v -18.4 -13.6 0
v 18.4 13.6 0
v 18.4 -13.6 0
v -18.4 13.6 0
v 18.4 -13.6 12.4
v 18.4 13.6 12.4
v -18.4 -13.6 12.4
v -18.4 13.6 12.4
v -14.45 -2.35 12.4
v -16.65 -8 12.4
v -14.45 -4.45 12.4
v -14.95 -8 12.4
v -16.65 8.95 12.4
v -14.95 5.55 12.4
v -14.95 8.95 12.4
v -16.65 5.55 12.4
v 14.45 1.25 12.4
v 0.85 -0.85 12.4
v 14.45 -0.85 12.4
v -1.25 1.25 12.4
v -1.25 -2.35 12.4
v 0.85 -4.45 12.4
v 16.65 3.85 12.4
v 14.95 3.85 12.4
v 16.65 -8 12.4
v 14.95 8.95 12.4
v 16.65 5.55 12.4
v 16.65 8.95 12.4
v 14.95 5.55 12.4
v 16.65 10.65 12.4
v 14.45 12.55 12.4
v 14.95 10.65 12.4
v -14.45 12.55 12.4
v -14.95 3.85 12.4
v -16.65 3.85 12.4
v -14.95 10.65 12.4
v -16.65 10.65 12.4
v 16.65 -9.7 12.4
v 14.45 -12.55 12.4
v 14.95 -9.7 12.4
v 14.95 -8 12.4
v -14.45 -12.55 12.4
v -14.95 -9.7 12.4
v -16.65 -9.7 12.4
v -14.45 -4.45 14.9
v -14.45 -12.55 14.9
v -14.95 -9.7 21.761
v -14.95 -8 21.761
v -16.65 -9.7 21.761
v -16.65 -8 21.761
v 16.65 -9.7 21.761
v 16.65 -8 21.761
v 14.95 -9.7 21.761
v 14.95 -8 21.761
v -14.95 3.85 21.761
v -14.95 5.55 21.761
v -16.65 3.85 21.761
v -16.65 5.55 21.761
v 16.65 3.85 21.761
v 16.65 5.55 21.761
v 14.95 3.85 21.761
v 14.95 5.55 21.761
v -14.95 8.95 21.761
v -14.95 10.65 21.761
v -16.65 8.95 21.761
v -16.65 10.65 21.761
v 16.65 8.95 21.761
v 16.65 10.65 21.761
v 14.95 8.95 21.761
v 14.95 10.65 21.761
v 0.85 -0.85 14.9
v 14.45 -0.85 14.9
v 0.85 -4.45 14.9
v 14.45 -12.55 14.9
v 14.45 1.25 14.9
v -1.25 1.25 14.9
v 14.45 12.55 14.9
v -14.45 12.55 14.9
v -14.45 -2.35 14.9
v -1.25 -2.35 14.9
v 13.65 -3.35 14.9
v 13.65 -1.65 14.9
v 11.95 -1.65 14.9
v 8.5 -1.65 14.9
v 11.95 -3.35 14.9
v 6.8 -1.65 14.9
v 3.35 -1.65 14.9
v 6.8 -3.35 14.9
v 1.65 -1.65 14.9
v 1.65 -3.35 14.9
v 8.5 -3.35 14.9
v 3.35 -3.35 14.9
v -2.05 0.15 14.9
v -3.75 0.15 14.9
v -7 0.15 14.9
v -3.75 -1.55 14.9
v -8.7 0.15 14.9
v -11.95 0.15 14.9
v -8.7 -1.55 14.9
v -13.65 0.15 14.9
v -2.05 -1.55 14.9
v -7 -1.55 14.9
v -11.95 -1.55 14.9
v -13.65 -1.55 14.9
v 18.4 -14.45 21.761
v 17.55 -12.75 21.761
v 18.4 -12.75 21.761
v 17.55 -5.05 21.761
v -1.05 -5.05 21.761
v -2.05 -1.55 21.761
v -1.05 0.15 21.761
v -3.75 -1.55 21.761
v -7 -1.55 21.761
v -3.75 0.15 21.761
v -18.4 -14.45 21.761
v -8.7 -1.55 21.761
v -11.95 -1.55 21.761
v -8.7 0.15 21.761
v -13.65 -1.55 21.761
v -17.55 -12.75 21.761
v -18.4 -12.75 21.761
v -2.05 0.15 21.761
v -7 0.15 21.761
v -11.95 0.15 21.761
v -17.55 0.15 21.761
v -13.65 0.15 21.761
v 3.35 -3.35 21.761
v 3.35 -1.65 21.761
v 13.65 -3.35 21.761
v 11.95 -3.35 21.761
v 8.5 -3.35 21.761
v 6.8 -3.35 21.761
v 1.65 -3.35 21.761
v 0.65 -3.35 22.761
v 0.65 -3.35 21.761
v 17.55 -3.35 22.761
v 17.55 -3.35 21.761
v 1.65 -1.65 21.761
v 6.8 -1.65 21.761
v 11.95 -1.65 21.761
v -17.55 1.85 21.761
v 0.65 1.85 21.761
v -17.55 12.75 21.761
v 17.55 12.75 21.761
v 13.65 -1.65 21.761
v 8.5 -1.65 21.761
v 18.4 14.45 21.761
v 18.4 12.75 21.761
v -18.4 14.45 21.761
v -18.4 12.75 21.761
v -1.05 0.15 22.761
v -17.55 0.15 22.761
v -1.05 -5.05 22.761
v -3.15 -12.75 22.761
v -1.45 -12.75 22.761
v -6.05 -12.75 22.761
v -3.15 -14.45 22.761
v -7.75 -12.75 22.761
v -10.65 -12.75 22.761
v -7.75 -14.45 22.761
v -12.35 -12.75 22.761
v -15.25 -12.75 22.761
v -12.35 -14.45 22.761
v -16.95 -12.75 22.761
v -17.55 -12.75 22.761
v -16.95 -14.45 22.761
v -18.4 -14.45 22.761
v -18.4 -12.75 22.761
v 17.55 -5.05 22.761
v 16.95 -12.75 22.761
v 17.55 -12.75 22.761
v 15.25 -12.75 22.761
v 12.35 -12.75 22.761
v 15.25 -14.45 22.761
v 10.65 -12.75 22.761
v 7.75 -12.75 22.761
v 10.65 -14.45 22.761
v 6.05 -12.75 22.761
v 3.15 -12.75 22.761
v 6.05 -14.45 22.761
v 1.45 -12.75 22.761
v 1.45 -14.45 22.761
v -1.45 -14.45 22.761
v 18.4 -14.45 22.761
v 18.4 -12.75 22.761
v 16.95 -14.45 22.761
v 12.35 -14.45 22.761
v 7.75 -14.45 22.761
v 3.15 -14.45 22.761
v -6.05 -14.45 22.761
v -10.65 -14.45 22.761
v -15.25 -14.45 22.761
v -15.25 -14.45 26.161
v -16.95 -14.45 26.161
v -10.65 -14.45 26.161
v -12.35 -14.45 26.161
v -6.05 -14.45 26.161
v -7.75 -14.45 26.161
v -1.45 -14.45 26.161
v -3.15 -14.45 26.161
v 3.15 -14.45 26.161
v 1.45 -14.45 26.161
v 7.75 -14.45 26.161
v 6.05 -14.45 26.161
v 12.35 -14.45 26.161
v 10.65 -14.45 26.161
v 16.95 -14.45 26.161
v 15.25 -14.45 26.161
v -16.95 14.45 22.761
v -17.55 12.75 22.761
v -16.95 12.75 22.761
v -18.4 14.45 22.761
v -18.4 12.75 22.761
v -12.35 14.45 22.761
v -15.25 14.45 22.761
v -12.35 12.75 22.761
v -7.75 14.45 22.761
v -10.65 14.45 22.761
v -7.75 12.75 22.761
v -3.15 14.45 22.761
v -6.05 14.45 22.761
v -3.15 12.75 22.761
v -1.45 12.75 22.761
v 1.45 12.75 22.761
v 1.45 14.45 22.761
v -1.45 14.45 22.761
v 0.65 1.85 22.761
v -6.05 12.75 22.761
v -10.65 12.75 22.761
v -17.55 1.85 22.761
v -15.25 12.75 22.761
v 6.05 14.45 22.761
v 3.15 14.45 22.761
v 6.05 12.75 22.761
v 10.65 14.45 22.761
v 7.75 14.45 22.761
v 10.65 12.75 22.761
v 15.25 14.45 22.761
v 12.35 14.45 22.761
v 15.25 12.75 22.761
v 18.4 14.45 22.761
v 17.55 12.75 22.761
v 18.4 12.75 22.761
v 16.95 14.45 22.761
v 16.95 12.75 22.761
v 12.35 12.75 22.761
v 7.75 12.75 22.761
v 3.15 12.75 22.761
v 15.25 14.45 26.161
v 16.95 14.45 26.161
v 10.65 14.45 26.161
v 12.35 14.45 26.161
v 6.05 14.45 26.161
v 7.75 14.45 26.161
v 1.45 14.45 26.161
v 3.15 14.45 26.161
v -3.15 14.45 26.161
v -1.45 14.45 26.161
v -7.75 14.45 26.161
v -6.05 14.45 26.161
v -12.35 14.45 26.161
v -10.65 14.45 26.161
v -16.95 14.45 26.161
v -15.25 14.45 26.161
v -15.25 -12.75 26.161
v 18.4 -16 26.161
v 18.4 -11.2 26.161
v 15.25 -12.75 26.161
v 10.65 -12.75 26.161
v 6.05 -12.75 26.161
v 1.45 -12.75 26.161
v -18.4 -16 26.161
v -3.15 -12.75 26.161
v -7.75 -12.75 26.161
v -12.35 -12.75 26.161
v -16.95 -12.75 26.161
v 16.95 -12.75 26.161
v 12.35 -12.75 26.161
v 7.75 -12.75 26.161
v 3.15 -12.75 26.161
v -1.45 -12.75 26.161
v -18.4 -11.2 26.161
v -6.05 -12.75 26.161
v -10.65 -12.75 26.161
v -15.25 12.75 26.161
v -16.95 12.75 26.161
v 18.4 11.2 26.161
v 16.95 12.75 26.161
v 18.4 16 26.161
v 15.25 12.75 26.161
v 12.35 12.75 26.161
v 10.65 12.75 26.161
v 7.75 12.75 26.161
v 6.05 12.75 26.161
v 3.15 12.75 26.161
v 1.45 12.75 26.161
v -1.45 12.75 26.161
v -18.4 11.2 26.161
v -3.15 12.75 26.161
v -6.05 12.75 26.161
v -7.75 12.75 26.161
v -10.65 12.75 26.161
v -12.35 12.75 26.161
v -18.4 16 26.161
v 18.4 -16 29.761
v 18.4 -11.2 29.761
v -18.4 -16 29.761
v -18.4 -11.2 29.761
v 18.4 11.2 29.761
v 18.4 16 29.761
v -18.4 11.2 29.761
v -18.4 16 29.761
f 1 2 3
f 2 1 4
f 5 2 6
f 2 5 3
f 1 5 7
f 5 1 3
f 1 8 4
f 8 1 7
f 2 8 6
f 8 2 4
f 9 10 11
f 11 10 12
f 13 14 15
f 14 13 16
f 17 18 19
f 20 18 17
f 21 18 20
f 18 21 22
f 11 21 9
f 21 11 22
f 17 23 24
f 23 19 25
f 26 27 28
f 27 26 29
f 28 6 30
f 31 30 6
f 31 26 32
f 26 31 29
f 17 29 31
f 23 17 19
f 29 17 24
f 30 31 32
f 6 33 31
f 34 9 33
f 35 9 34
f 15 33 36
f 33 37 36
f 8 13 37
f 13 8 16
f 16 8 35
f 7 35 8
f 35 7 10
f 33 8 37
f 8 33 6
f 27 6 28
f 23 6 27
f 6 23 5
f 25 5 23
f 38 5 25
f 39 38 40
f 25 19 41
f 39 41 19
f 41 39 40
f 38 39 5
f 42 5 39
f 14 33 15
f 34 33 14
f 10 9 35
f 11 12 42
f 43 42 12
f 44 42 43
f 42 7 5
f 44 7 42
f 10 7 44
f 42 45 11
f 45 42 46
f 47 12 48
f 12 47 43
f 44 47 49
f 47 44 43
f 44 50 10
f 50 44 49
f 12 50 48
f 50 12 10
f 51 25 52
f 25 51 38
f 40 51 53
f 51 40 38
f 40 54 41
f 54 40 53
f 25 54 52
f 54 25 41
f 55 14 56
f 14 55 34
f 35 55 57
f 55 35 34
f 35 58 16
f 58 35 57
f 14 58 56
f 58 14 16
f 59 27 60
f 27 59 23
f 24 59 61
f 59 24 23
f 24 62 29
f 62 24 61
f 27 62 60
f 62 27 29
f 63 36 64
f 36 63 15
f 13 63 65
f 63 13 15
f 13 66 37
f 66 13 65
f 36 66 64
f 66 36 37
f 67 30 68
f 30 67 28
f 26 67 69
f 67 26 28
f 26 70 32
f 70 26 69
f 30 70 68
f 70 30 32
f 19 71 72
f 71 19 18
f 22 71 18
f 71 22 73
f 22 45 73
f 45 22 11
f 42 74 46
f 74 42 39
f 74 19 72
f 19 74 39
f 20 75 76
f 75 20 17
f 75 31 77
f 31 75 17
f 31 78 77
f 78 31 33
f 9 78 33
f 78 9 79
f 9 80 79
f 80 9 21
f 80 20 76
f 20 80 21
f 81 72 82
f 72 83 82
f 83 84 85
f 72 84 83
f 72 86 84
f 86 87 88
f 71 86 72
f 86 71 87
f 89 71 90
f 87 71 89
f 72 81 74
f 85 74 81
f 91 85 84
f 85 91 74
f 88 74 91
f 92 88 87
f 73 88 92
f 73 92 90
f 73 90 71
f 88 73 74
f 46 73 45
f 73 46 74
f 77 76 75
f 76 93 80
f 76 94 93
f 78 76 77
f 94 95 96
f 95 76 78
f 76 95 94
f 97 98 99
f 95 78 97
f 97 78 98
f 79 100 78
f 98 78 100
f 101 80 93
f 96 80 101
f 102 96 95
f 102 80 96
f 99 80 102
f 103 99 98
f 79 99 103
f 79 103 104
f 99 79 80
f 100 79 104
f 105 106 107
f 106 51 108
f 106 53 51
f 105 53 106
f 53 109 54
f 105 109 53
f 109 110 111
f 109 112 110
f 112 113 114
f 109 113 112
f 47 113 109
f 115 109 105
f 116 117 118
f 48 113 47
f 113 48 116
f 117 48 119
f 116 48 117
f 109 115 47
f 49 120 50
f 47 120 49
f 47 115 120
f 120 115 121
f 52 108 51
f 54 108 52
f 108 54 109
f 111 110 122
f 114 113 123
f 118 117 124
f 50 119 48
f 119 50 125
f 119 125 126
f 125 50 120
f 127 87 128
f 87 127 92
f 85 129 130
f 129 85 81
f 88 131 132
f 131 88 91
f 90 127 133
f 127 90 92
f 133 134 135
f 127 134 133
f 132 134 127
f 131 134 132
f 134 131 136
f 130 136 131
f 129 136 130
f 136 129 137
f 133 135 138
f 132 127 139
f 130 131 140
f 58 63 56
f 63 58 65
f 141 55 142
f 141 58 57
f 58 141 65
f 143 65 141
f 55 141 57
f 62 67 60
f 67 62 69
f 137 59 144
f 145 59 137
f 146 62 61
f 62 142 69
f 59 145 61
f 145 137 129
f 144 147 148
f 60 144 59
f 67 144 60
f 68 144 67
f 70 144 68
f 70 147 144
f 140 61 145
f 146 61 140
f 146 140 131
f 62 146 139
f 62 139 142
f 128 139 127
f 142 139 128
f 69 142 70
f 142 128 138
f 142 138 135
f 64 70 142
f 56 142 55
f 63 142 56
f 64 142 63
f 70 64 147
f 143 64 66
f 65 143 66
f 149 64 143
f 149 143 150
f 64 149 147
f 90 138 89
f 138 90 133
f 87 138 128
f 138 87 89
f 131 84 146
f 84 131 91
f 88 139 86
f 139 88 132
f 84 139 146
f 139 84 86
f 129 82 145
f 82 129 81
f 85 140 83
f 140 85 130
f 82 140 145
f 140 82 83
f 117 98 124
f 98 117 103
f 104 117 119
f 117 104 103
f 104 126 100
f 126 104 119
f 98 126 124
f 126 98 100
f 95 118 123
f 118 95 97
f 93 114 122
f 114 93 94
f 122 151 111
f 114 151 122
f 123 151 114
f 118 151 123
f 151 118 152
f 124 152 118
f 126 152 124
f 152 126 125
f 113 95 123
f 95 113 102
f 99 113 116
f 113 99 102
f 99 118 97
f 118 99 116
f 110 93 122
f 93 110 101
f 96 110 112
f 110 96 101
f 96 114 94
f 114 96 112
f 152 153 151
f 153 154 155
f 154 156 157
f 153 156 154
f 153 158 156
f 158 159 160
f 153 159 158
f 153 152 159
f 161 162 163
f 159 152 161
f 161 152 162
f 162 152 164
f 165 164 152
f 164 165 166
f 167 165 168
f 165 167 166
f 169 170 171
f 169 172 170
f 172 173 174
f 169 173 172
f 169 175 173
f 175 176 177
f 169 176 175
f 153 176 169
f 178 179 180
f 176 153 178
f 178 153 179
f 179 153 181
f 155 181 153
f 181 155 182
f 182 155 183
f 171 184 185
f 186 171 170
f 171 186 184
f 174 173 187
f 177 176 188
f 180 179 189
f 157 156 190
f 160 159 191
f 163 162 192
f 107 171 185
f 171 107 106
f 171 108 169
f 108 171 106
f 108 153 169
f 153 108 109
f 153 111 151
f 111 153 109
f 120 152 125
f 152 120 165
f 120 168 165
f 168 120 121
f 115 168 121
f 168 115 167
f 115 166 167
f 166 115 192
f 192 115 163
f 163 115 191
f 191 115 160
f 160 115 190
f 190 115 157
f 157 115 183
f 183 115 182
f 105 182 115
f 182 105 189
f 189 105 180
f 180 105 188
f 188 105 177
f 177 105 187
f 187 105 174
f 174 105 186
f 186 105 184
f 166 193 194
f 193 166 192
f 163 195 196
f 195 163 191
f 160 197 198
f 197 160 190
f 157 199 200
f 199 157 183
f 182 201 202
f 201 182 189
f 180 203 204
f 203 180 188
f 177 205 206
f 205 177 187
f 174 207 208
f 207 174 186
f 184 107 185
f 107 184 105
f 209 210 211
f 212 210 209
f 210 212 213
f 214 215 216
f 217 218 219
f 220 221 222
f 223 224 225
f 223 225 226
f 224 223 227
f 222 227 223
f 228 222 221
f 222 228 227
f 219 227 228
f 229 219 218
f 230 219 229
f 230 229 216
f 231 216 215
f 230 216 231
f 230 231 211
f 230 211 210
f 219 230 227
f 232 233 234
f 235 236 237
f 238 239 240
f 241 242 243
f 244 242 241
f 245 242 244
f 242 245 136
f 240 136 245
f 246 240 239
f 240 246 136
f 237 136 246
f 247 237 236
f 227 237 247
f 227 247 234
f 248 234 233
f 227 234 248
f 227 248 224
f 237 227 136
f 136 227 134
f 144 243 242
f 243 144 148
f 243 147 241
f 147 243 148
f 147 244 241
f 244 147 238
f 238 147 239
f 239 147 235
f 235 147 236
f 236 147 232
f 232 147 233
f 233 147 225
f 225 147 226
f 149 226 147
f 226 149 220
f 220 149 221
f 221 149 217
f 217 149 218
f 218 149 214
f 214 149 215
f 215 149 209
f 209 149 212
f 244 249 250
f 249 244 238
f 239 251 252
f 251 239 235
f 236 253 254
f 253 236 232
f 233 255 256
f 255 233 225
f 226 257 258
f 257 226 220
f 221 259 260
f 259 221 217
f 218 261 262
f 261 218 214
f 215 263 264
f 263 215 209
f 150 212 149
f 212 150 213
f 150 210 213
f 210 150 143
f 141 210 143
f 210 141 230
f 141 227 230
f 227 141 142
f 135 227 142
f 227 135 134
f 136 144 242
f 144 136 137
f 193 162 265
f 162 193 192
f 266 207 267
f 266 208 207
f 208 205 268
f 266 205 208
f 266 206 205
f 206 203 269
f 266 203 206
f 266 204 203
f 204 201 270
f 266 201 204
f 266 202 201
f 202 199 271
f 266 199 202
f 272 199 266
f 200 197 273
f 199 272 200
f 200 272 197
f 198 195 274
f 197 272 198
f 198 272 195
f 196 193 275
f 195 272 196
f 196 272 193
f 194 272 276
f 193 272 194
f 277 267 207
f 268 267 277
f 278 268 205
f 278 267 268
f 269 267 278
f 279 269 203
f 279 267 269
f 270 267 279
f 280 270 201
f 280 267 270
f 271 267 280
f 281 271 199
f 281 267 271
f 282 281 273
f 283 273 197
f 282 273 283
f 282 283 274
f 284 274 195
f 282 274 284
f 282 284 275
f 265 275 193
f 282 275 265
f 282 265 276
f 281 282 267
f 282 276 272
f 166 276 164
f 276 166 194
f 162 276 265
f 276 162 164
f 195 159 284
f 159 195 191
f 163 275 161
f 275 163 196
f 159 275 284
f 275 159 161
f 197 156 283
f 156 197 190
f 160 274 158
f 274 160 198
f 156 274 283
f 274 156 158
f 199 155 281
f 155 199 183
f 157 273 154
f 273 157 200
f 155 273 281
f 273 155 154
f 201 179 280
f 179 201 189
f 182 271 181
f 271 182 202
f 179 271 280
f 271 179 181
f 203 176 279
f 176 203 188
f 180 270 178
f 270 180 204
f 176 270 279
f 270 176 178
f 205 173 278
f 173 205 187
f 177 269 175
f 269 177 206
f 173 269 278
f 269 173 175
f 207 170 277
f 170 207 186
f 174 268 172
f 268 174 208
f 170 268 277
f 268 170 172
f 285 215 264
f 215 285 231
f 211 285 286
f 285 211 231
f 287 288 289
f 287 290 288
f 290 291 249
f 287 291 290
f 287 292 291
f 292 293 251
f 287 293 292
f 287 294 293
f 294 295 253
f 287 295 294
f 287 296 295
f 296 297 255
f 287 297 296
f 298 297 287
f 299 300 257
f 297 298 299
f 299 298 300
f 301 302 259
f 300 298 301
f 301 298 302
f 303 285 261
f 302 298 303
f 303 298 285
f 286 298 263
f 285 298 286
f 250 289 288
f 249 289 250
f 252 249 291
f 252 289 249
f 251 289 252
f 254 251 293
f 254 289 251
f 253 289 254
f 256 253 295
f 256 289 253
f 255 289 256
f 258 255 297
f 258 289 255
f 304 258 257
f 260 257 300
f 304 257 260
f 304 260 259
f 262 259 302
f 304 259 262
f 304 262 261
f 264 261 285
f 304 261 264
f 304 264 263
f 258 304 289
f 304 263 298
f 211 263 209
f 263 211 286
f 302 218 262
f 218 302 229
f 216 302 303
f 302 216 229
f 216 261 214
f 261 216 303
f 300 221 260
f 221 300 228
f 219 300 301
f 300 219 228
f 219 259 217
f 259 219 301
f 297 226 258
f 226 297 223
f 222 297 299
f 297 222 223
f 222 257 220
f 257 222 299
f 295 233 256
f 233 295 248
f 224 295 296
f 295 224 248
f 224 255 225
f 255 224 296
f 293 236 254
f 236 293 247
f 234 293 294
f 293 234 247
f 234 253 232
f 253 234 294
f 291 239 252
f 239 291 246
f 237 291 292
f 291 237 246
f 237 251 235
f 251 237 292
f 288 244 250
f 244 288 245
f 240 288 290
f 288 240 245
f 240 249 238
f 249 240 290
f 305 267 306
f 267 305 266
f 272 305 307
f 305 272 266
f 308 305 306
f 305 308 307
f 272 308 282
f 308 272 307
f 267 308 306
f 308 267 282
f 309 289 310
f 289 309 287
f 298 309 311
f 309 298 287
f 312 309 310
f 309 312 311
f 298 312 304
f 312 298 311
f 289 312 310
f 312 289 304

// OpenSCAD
// Generated by SolidPython 0.4.2 on 2020-09-29 23:20:26
//!OpenSCAD

scale(v = 0.0100000000) {
	translate(v = [-1840, -1360, 0]) {
		union() {
			color(c = [0.4000000000, 0.4000000000, 0.4000000000]) {
				translate(v = [0, 0, 0]) {
					linear_extrude(height = 1000.0000000000) {
						polygon(paths = [[0, 1, 2, 3]], points = [[0, 0], [0, 2720], [3680, 2720], [3680, 0]]);
					}
				}
			}
			color(c = [0.2000000000, 0.6000000000, 0.2000000000]) {
				translate(v = [0, 0, 1000.0000000000]) {
					linear_extrude(height = 120.0000000000) {
						polygon(paths = [[0, 1, 2, 3]], points = [[0, 1305], [0, 2720], [3680, 2720], [3680, 1305]]);
					}
				}
			}
			color(c = [0.4000000000, 0.4000000000, 0.4000000000]) {
				translate(v = [0, 0, 1000.0000000000]) {
					linear_extrude(height = 120.0000000000) {
						polygon(paths = [[0, 1, 2, 3]], points = [[0, 0], [0, 1305], [3680, 1305], [3680, 0]]);
					}
				}
			}
			color(c = [0.9000000000, 0.6000000000, 0.6000000000]) {
				translate(v = [0, 0, 1120.0000000000]) {
					linear_extrude(height = 120.0000000000) {
						polygon(paths = [[0, 1, 2, 3]], points = [[135, 1615], [135, 2485], [395, 2485], [395, 1615]]);
					}
				}
			}
			color(c = [0.9000000000, 0.6000000000, 0.6000000000]) {
				translate(v = [0, 0, 1120.0000000000]) {
					linear_extrude(height = 120.0000000000) {
						polygon(paths = [[0, 1, 2, 3]], points = [[3285, 1615], [3285, 2485], [3545, 2485], [3545, 1615]]);
					}
				}
			}
			color(c = [0.9000000000, 0.6000000000, 0.9000000000]) {
				translate(v = [0, 0, 1120.0000000000]) {
					linear_extrude(height = 120.0000000000) {
						polygon(paths = [[0, 1, 2, 3]], points = [[135, 235], [135, 785], [395, 785], [395, 235]]);
					}
				}
			}
			color(c = [0.9000000000, 0.6000000000, 0.9000000000]) {
				translate(v = [0, 0, 1120.0000000000]) {
					linear_extrude(height = 120.0000000000) {
						polygon(paths = [[0, 1, 2, 3]], points = [[3285, 235], [3285, 785], [3545, 785], [3545, 235]]);
					}
				}
			}
			color(c = [0.2000000000, 0.6000000000, 0.2000000000]) {
				translate(v = [0, 0, 1120.0000000000]) {
					linear_extrude(height = 120.0000000000) {
						difference() {
							polygon(paths = [[0, 1, 2, 3]], points = [[0, 1305], [0, 2720], [3680, 2720], [3680, 1305]]);
							polygon(paths = [[0, 1, 2, 3]], points = [[135, 1615], [395, 1615], [395, 2485], [135, 2485]]);
							polygon(paths = [[0, 1, 2, 3]], points = [[3285, 1615], [3545, 1615], [3545, 2485], [3285, 2485]]);
						}
					}
				}
			}
			color(c = [0.4000000000, 0.4000000000, 0.4000000000]) {
				translate(v = [0, 0, 1120.0000000000]) {
					linear_extrude(height = 120.0000000000) {
						difference() {
							polygon(paths = [[0, 1, 2, 3]], points = [[0, 0], [0, 1305], [3680, 1305], [3680, 0]]);
							polygon(paths = [[0, 1, 2, 3]], points = [[135, 235], [395, 235], [395, 785], [135, 785]]);
							polygon(paths = [[0, 1, 2, 3]], points = [[3285, 235], [3545, 235], [3545, 785], [3285, 785]]);
						}
					}
				}
			}
			color(c = [0.1000000000, 0.1000000000, 0.1000000000]) {
				translate(v = [0, 0, 1240.0000000000]) {
					linear_extrude(height = 70.0000000000) {
						polygon(paths = [[0, 1, 2, 3]], points = [[175, 390], [175, 560], [345, 560], [345, 390]]);
					}
				}
			}
			color(c = [0.1000000000, 0.1000000000, 0.1000000000]) {
				translate(v = [0, 0, 1240.0000000000]) {
					linear_extrude(height = 70.0000000000) {
						polygon(paths = [[0, 1, 2, 3]], points = [[3335, 390], [3335, 560], [3505, 560], [3505, 390]]);
					}
				}
			}
			color(c = [0.1000000000, 0.1000000000, 0.1000000000]) {
				translate(v = [0, 0, 1240.0000000000]) {
					linear_extrude(height = 70.0000000000) {
						polygon(paths = [[0, 1, 2, 3]], points = [[175, 1745], [175, 1915], [345, 1915], [345, 1745]]);
					}
				}
			}
			color(c = [0.1000000000, 0.1000000000, 0.1000000000]) {
				translate(v = [0, 0, 1240.0000000000]) {
					linear_extrude(height = 70.0000000000) {
						polygon(paths = [[0, 1, 2, 3]], points = [[3335, 1745], [3335, 1915], [3505, 1915], [3505, 1745]]);
					}
				}
			}
			color(c = [0.1000000000, 0.1000000000, 0.1000000000]) {
				translate(v = [0, 0, 1240.0000000000]) {
					linear_extrude(height = 70.0000000000) {
						polygon(paths = [[0, 1, 2, 3]], points = [[175, 2255], [175, 2425], [345, 2425], [345, 2255]]);
					}
				}
			}
			color(c = [0.1000000000, 0.1000000000, 0.1000000000]) {
				translate(v = [0, 0, 1240.0000000000]) {
					linear_extrude(height = 70.0000000000) {
						polygon(paths = [[0, 1, 2, 3]], points = [[3335, 2255], [3335, 2425], [3505, 2425], [3505, 2255]]);
					}
				}
			}
			color(c = [1.0000000000, 1.0000000000, 1.0000000000]) {
				translate(v = [0, 0, 1240.0000000000]) {
					linear_extrude(height = 70.0000000000) {
						polygon(paths = [[0, 1, 2, 3, 4, 5]], points = [[395, 105], [395, 915], [1925, 915], [1925, 1275], [3285, 1275], [3285, 105]]);
					}
				}
			}
			color(c = [1.0000000000, 1.0000000000, 1.0000000000]) {
				translate(v = [0, 0, 1240.0000000000]) {
					linear_extrude(height = 70.0000000000) {
						polygon(paths = [[0, 1, 2, 3, 4, 5]], points = [[395, 1125], [395, 2615], [3285, 2615], [3285, 1485], [1715, 1485], [1715, 1125]]);
					}
				}
			}
			color(c = [0.1000000000, 0.1000000000, 0.1000000000]) {
				translate(v = [0, 0, 1310.0000000000]) {
					linear_extrude(height = 180.0000000000) {
						polygon(paths = [[0, 1, 2, 3]], points = [[175, 390], [175, 560], [345, 560], [345, 390]]);
					}
				}
			}
			color(c = [0.1000000000, 0.1000000000, 0.1000000000]) {
				translate(v = [0, 0, 1310.0000000000]) {
					linear_extrude(height = 180.0000000000) {
						polygon(paths = [[0, 1, 2, 3]], points = [[3335, 390], [3335, 560], [3505, 560], [3505, 390]]);
					}
				}
			}
			color(c = [0.1000000000, 0.1000000000, 0.1000000000]) {
				translate(v = [0, 0, 1310.0000000000]) {
					linear_extrude(height = 180.0000000000) {
						polygon(paths = [[0, 1, 2, 3]], points = [[175, 1745], [175, 1915], [345, 1915], [345, 1745]]);
					}
				}
			}
			color(c = [0.1000000000, 0.1000000000, 0.1000000000]) {
				translate(v = [0, 0, 1310.0000000000]) {
					linear_extrude(height = 180.0000000000) {
						polygon(paths = [[0, 1, 2, 3]], points = [[3335, 1745], [3335, 1915], [3505, 1915], [3505, 1745]]);
					}
				}
			}
			color(c = [0.1000000000, 0.1000000000, 0.1000000000]) {
				translate(v = [0, 0, 1310.0000000000]) {
					linear_extrude(height = 180.0000000000) {
						polygon(paths = [[0, 1, 2, 3]], points = [[175, 2255], [175, 2425], [345, 2425], [345, 2255]]);
					}
				}
			}
			color(c = [0.1000000000, 0.1000000000, 0.1000000000]) {
				translate(v = [0, 0, 1310.0000000000]) {
					linear_extrude(height = 180.0000000000) {
						polygon(paths = [[0, 1, 2, 3]], points = [[3335, 2255], [3335, 2425], [3505, 2425], [3505, 2255]]);
					}
				}
			}
			color(c = [0.7000000000, 0, 0]) {
				translate(v = [0, 0, 1310.0000000000]) {
					linear_extrude(height = 180.0000000000) {
						polygon(paths = [[0, 1, 2, 3, 4, 5]], points = [[395, 105], [395, 915], [1925, 915], [1925, 1275], [3285, 1275], [3285, 105]]);
					}
				}
			}
			color(c = [0.7000000000, 0, 0]) {
				translate(v = [0, 0, 1310.0000000000]) {
					linear_extrude(height = 180.0000000000) {
						polygon(paths = [[0, 1, 2, 3, 4, 5]], points = [[395, 1125], [395, 2615], [3285, 2615], [3285, 1485], [1715, 1485], [1715, 1125]]);
					}
				}
			}
			color(c = [0.1000000000, 0.1000000000, 0.1000000000]) {
				translate(v = [0, 0, 1490.0000000000]) {
					linear_extrude(height = 686.1000000000) {
						polygon(paths = [[0, 1, 2, 3]], points = [[175, 390], [175, 560], [345, 560], [345, 390]]);
					}
				}
			}
			color(c = [0.1000000000, 0.1000000000, 0.1000000000]) {
				translate(v = [0, 0, 1490.0000000000]) {
					linear_extrude(height = 686.1000000000) {
						polygon(paths = [[0, 1, 2, 3]], points = [[3335, 390], [3335, 560], [3505, 560], [3505, 390]]);
					}
				}
			}
			color(c = [0.1000000000, 0.1000000000, 0.1000000000]) {
				translate(v = [0, 0, 1490.0000000000]) {
					linear_extrude(height = 686.1000000000) {
						polygon(paths = [[0, 1, 2, 3]], points = [[2005, 1025], [2005, 1195], [2175, 1195], [2175, 1025]]);
					}
				}
			}
			color(c = [0.1000000000, 0.1000000000, 0.1000000000]) {
				translate(v = [0, 0, 1490.0000000000]) {
					linear_extrude(height = 686.1000000000) {
						polygon(paths = [[0, 1, 2, 3]], points = [[2520, 1025], [2520, 1195], [2690, 1195], [2690, 1025]]);
					}
				}
			}
			color(c = [0.1000000000, 0.1000000000, 0.1000000000]) {
				translate(v = [0, 0, 1490.0000000000]) {
					linear_extrude(height = 686.1000000000) {
						polygon(paths = [[0, 1, 2, 3]], points = [[3035, 1025], [3035, 1195], [3205, 1195], [3205, 1025]]);
					}
				}
			}
			color(c = [0.1000000000, 0.1000000000, 0.1000000000]) {
				translate(v = [0, 0, 1490.0000000000]) {
					linear_extrude(height = 686.1000000000) {
						polygon(paths = [[0, 1, 2, 3]], points = [[475, 1205], [475, 1375], [645, 1375], [645, 1205]]);
					}
				}
			}
			color(c = [0.1000000000, 0.1000000000, 0.1000000000]) {
				translate(v = [0, 0, 1490.0000000000]) {
					linear_extrude(height = 686.1000000000) {
						polygon(paths = [[0, 1, 2, 3]], points = [[970, 1205], [970, 1375], [1140, 1375], [1140, 1205]]);
					}
				}
			}
			color(c = [0.1000000000, 0.1000000000, 0.1000000000]) {
				translate(v = [0, 0, 1490.0000000000]) {
					linear_extrude(height = 686.1000000000) {
						polygon(paths = [[0, 1, 2, 3]], points = [[1465, 1205], [1465, 1375], [1635, 1375], [1635, 1205]]);
					}
				}
			}
			color(c = [0.1000000000, 0.1000000000, 0.1000000000]) {
				translate(v = [0, 0, 1490.0000000000]) {
					linear_extrude(height = 686.1000000000) {
						polygon(paths = [[0, 1, 2, 3]], points = [[175, 1745], [175, 1915], [345, 1915], [345, 1745]]);
					}
				}
			}
			color(c = [0.1000000000, 0.1000000000, 0.1000000000]) {
				translate(v = [0, 0, 1490.0000000000]) {
					linear_extrude(height = 686.1000000000) {
						polygon(paths = [[0, 1, 2, 3]], points = [[3335, 1745], [3335, 1915], [3505, 1915], [3505, 1745]]);
					}
				}
			}
			color(c = [0.1000000000, 0.1000000000, 0.1000000000]) {
				translate(v = [0, 0, 1490.0000000000]) {
					linear_extrude(height = 686.1000000000) {
						polygon(paths = [[0, 1, 2, 3]], points = [[175, 2255], [175, 2425], [345, 2425], [345, 2255]]);
					}
				}
			}
			color(c = [0.1000000000, 0.1000000000, 0.1000000000]) {
				translate(v = [0, 0, 1490.0000000000]) {
					linear_extrude(height = 686.1000000000) {
						polygon(paths = [[0, 1, 2, 3]], points = [[3335, 2255], [3335, 2425], [3505, 2425], [3505, 2255]]);
					}
				}
			}
			color(c = [0.9000000000, 0.6000000000, 0.6000000000]) {
				translate(v = [0, 0, 2176.1000000000]) {
					linear_extrude(height = 100.0000000000) {
						polygon(paths = [[0, 1, 2, 3, 4, 5, 6, 7, 8, 9]], points = [[0, -85], [0, 85], [85, 85], [85, 1375], [1735, 1375], [1735, 855], [3595, 855], [3595, 85], [3680, 85], [3680, -85]]);
					}
				}
			}
			color(c = [0.9000000000, 0.6000000000, 0.6000000000]) {
				translate(v = [0, 0, 2176.1000000000]) {
					linear_extrude(height = 100.0000000000) {
						polygon(paths = [[0, 1, 2, 3, 4, 5, 6, 7, 8, 9]], points = [[1905, 1025], [1905, 1545], [85, 1545], [85, 2635], [0, 2635], [0, 2805], [3680, 2805], [3680, 2635], [3595, 2635], [3595, 1025]]);
					}
				}
			}
			color(c = [0.5000000000, 0.5000000000, 0.5000000000]) {
				translate(v = [0, 0, 2276.1000000000]) {
					linear_extrude(height = 340.0000000000) {
						polygon(paths = [[0, 1, 2, 3]], points = [[145, -85], [145, 85], [315, 85], [315, -85]]);
					}
				}
			}
			color(c = [0.5000000000, 0.5000000000, 0.5000000000]) {
				translate(v = [0, 0, 2276.1000000000]) {
					linear_extrude(height = 340.0000000000) {
						polygon(paths = [[0, 1, 2, 3]], points = [[605, -85], [605, 85], [775, 85], [775, -85]]);
					}
				}
			}
			color(c = [0.5000000000, 0.5000000000, 0.5000000000]) {
				translate(v = [0, 0, 2276.1000000000]) {
					linear_extrude(height = 340.0000000000) {
						polygon(paths = [[0, 1, 2, 3]], points = [[1065, -85], [1065, 85], [1235, 85], [1235, -85]]);
					}
				}
			}
			color(c = [0.5000000000, 0.5000000000, 0.5000000000]) {
				translate(v = [0, 0, 2276.1000000000]) {
					linear_extrude(height = 340.0000000000) {
						polygon(paths = [[0, 1, 2, 3]], points = [[1525, -85], [1525, 85], [1695, 85], [1695, -85]]);
					}
				}
			}
			color(c = [0.5000000000, 0.5000000000, 0.5000000000]) {
				translate(v = [0, 0, 2276.1000000000]) {
					linear_extrude(height = 340.0000000000) {
						polygon(paths = [[0, 1, 2, 3]], points = [[1985, -85], [1985, 85], [2155, 85], [2155, -85]]);
					}
				}
			}
			color(c = [0.5000000000, 0.5000000000, 0.5000000000]) {
				translate(v = [0, 0, 2276.1000000000]) {
					linear_extrude(height = 340.0000000000) {
						polygon(paths = [[0, 1, 2, 3]], points = [[2445, -85], [2445, 85], [2615, 85], [2615, -85]]);
					}
				}
			}
			color(c = [0.5000000000, 0.5000000000, 0.5000000000]) {
				translate(v = [0, 0, 2276.1000000000]) {
					linear_extrude(height = 340.0000000000) {
						polygon(paths = [[0, 1, 2, 3]], points = [[2905, -85], [2905, 85], [3075, 85], [3075, -85]]);
					}
				}
			}
			color(c = [0.5000000000, 0.5000000000, 0.5000000000]) {
				translate(v = [0, 0, 2276.1000000000]) {
					linear_extrude(height = 340.0000000000) {
						polygon(paths = [[0, 1, 2, 3]], points = [[3365, -85], [3365, 85], [3535, 85], [3535, -85]]);
					}
				}
			}
			color(c = [0.5000000000, 0.5000000000, 0.5000000000]) {
				translate(v = [0, 0, 2276.1000000000]) {
					linear_extrude(height = 340.0000000000) {
						polygon(paths = [[0, 1, 2, 3]], points = [[145, 2635], [145, 2805], [315, 2805], [315, 2635]]);
					}
				}
			}
			color(c = [0.5000000000, 0.5000000000, 0.5000000000]) {
				translate(v = [0, 0, 2276.1000000000]) {
					linear_extrude(height = 340.0000000000) {
						polygon(paths = [[0, 1, 2, 3]], points = [[605, 2635], [605, 2805], [775, 2805], [775, 2635]]);
					}
				}
			}
			color(c = [0.5000000000, 0.5000000000, 0.5000000000]) {
				translate(v = [0, 0, 2276.1000000000]) {
					linear_extrude(height = 340.0000000000) {
						polygon(paths = [[0, 1, 2, 3]], points = [[1065, 2635], [1065, 2805], [1235, 2805], [1235, 2635]]);
					}
				}
			}
			color(c = [0.5000000000, 0.5000000000, 0.5000000000]) {
				translate(v = [0, 0, 2276.1000000000]) {
					linear_extrude(height = 340.0000000000) {
						polygon(paths = [[0, 1, 2, 3]], points = [[1525, 2635], [1525, 2805], [1695, 2805], [1695, 2635]]);
					}
				}
			}
			color(c = [0.5000000000, 0.5000000000, 0.5000000000]) {
				translate(v = [0, 0, 2276.1000000000]) {
					linear_extrude(height = 340.0000000000) {
						polygon(paths = [[0, 1, 2, 3]], points = [[1985, 2635], [1985, 2805], [2155, 2805], [2155, 2635]]);
					}
				}
			}
			color(c = [0.5000000000, 0.5000000000, 0.5000000000]) {
				translate(v = [0, 0, 2276.1000000000]) {
					linear_extrude(height = 340.0000000000) {
						polygon(paths = [[0, 1, 2, 3]], points = [[2445, 2635], [2445, 2805], [2615, 2805], [2615, 2635]]);
					}
				}
			}
			color(c = [0.5000000000, 0.5000000000, 0.5000000000]) {
				translate(v = [0, 0, 2276.1000000000]) {
					linear_extrude(height = 340.0000000000) {
						polygon(paths = [[0, 1, 2, 3]], points = [[2905, 2635], [2905, 2805], [3075, 2805], [3075, 2635]]);
					}
				}
			}
			color(c = [0.5000000000, 0.5000000000, 0.5000000000]) {
				translate(v = [0, 0, 2276.1000000000]) {
					linear_extrude(height = 340.0000000000) {
						polygon(paths = [[0, 1, 2, 3]], points = [[3365, 2635], [3365, 2805], [3535, 2805], [3535, 2635]]);
					}
				}
			}
			color(c = [0.3000000000, 0.3000000000, 1]) {
				translate(v = [0, 0, 2616.1000000000]) {
					linear_extrude(height = 360.0000000000) {
						polygon(paths = [[0, 1, 2, 3]], points = [[0, -240], [0, 240], [3680, 240], [3680, -240]]);
					}
				}
			}
			color(c = [0.3000000000, 0.3000000000, 1]) {
				translate(v = [0, 0, 2616.1000000000]) {
					linear_extrude(height = 360.0000000000) {
						polygon(paths = [[0, 1, 2, 3]], points = [[0, 2480], [0, 2960], [3680, 2960], [3680, 2480]]);
					}
				}
			}
		}
	}
}
